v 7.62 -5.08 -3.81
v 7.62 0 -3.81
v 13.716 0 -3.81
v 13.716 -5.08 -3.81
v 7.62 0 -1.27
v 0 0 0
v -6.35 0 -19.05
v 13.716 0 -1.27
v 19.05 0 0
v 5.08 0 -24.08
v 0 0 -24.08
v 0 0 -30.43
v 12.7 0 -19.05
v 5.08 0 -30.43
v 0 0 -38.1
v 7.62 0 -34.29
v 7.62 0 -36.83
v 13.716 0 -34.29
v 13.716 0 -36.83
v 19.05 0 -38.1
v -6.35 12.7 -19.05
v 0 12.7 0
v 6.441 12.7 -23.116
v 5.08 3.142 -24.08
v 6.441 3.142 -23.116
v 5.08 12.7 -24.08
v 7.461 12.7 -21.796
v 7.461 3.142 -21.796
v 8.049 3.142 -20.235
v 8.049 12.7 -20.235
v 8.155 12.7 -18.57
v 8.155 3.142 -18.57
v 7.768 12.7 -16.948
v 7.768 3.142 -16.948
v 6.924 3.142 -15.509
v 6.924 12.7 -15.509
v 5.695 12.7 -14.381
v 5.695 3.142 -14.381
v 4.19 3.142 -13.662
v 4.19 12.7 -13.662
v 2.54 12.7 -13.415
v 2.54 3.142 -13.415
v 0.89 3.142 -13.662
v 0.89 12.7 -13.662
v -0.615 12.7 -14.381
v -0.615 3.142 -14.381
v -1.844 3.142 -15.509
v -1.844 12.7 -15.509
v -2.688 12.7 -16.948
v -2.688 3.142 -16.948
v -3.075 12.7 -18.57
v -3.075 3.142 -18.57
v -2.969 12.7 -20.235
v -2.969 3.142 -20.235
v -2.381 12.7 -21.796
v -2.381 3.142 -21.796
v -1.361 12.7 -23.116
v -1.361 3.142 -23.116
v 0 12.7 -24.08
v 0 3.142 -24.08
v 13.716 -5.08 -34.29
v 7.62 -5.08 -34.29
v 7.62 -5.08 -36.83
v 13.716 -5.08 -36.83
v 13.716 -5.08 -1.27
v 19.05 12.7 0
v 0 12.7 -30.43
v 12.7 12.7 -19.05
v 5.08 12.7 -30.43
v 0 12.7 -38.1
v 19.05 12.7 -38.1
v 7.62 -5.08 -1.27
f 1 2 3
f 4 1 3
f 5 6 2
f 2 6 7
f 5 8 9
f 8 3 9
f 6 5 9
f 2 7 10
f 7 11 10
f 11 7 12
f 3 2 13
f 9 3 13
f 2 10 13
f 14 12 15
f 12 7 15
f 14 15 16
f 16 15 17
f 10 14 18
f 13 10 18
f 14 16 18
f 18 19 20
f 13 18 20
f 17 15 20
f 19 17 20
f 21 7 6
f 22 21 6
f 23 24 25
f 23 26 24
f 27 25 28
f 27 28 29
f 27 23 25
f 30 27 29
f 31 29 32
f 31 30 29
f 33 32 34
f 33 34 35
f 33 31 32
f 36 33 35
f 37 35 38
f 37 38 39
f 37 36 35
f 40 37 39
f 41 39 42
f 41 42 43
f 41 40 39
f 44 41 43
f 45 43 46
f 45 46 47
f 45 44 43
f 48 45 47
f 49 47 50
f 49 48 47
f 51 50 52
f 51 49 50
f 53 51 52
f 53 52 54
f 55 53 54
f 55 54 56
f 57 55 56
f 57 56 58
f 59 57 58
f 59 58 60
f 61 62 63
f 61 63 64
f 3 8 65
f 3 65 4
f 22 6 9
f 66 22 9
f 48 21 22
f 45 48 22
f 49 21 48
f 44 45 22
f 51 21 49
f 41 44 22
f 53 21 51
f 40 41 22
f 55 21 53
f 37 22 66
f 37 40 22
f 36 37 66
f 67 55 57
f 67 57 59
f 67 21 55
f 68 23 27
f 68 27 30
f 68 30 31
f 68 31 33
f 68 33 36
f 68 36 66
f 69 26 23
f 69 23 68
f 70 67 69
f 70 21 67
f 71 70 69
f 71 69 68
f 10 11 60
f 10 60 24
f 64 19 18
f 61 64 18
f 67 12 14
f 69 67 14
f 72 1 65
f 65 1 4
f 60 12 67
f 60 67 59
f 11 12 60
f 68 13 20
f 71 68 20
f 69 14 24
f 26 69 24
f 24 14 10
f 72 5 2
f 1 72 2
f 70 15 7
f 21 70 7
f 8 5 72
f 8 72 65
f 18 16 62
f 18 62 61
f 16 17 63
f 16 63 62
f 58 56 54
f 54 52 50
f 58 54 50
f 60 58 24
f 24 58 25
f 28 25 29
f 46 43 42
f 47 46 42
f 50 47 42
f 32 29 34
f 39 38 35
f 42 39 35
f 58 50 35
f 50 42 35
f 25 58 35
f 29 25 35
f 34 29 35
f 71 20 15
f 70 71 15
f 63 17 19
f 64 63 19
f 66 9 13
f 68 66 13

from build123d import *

# Parameters (mm, degrees)
BOSS_EXTRUDE1_DEPTH       = 12.7
SKETCH2_R                 = 5.635000033
HAPTIC_MOTOR_CUTOUT_DEPTH = 9.557999934
SKETCH3_W                 = 5.08
SKETCH3_H                 = 6.35
HAPTIC_WIRE_CUTOUT_DEPTH  = 13.7
SKETCH4_W                 = 6.096
SKETCH4_H                 = 2.54
PINS_DEPTH                = 5.08


with BuildPart() as part:
    # Sketch1 → Boss-Extrude1 (new body)
    with BuildSketch(Plane(origin=(0, 0, 0), x_dir=(1, 0, 0), z_dir=(0, 1, 0))):
        Polygon((0, 0), (19.05, 0), (12.7, 19.05), (19.05, 38.1), (0, 38.1), (-6.35, 19.05), align=None)
    extrude(amount=BOSS_EXTRUDE1_DEPTH)

    # Sketch2 → Haptic Motor Cutout (cut)
    with BuildSketch(Plane.XZ.offset(-12.7)):
        with Locations((2.54, -19.05)):
            Circle(SKETCH2_R)
    extrude(amount=HAPTIC_MOTOR_CUTOUT_DEPTH, mode=Mode.SUBTRACT)

    # Sketch3 → Haptic Wire Cutout (cut, through all)
    with BuildSketch(Plane.XZ):
        with Locations((2.54, -27.255072104)):
            Rectangle(SKETCH3_W, SKETCH3_H)
    extrude(amount=-HAPTIC_WIRE_CUTOUT_DEPTH, mode=Mode.SUBTRACT)

    # Sketch4 → Pins (add)
    with BuildSketch(Plane.XZ):
        with Locations((10.668, -35.56)):
            Rectangle(SKETCH4_W, SKETCH4_H)
    pins = extrude(amount=PINS_DEPTH)

    # Mirror1: Pins across plane
    add(pins.mirror(Plane(origin=(0, 0, -19.05), x_dir=(1, 0, 0), z_dir=(0, 0, -1))))


solid = part.part
